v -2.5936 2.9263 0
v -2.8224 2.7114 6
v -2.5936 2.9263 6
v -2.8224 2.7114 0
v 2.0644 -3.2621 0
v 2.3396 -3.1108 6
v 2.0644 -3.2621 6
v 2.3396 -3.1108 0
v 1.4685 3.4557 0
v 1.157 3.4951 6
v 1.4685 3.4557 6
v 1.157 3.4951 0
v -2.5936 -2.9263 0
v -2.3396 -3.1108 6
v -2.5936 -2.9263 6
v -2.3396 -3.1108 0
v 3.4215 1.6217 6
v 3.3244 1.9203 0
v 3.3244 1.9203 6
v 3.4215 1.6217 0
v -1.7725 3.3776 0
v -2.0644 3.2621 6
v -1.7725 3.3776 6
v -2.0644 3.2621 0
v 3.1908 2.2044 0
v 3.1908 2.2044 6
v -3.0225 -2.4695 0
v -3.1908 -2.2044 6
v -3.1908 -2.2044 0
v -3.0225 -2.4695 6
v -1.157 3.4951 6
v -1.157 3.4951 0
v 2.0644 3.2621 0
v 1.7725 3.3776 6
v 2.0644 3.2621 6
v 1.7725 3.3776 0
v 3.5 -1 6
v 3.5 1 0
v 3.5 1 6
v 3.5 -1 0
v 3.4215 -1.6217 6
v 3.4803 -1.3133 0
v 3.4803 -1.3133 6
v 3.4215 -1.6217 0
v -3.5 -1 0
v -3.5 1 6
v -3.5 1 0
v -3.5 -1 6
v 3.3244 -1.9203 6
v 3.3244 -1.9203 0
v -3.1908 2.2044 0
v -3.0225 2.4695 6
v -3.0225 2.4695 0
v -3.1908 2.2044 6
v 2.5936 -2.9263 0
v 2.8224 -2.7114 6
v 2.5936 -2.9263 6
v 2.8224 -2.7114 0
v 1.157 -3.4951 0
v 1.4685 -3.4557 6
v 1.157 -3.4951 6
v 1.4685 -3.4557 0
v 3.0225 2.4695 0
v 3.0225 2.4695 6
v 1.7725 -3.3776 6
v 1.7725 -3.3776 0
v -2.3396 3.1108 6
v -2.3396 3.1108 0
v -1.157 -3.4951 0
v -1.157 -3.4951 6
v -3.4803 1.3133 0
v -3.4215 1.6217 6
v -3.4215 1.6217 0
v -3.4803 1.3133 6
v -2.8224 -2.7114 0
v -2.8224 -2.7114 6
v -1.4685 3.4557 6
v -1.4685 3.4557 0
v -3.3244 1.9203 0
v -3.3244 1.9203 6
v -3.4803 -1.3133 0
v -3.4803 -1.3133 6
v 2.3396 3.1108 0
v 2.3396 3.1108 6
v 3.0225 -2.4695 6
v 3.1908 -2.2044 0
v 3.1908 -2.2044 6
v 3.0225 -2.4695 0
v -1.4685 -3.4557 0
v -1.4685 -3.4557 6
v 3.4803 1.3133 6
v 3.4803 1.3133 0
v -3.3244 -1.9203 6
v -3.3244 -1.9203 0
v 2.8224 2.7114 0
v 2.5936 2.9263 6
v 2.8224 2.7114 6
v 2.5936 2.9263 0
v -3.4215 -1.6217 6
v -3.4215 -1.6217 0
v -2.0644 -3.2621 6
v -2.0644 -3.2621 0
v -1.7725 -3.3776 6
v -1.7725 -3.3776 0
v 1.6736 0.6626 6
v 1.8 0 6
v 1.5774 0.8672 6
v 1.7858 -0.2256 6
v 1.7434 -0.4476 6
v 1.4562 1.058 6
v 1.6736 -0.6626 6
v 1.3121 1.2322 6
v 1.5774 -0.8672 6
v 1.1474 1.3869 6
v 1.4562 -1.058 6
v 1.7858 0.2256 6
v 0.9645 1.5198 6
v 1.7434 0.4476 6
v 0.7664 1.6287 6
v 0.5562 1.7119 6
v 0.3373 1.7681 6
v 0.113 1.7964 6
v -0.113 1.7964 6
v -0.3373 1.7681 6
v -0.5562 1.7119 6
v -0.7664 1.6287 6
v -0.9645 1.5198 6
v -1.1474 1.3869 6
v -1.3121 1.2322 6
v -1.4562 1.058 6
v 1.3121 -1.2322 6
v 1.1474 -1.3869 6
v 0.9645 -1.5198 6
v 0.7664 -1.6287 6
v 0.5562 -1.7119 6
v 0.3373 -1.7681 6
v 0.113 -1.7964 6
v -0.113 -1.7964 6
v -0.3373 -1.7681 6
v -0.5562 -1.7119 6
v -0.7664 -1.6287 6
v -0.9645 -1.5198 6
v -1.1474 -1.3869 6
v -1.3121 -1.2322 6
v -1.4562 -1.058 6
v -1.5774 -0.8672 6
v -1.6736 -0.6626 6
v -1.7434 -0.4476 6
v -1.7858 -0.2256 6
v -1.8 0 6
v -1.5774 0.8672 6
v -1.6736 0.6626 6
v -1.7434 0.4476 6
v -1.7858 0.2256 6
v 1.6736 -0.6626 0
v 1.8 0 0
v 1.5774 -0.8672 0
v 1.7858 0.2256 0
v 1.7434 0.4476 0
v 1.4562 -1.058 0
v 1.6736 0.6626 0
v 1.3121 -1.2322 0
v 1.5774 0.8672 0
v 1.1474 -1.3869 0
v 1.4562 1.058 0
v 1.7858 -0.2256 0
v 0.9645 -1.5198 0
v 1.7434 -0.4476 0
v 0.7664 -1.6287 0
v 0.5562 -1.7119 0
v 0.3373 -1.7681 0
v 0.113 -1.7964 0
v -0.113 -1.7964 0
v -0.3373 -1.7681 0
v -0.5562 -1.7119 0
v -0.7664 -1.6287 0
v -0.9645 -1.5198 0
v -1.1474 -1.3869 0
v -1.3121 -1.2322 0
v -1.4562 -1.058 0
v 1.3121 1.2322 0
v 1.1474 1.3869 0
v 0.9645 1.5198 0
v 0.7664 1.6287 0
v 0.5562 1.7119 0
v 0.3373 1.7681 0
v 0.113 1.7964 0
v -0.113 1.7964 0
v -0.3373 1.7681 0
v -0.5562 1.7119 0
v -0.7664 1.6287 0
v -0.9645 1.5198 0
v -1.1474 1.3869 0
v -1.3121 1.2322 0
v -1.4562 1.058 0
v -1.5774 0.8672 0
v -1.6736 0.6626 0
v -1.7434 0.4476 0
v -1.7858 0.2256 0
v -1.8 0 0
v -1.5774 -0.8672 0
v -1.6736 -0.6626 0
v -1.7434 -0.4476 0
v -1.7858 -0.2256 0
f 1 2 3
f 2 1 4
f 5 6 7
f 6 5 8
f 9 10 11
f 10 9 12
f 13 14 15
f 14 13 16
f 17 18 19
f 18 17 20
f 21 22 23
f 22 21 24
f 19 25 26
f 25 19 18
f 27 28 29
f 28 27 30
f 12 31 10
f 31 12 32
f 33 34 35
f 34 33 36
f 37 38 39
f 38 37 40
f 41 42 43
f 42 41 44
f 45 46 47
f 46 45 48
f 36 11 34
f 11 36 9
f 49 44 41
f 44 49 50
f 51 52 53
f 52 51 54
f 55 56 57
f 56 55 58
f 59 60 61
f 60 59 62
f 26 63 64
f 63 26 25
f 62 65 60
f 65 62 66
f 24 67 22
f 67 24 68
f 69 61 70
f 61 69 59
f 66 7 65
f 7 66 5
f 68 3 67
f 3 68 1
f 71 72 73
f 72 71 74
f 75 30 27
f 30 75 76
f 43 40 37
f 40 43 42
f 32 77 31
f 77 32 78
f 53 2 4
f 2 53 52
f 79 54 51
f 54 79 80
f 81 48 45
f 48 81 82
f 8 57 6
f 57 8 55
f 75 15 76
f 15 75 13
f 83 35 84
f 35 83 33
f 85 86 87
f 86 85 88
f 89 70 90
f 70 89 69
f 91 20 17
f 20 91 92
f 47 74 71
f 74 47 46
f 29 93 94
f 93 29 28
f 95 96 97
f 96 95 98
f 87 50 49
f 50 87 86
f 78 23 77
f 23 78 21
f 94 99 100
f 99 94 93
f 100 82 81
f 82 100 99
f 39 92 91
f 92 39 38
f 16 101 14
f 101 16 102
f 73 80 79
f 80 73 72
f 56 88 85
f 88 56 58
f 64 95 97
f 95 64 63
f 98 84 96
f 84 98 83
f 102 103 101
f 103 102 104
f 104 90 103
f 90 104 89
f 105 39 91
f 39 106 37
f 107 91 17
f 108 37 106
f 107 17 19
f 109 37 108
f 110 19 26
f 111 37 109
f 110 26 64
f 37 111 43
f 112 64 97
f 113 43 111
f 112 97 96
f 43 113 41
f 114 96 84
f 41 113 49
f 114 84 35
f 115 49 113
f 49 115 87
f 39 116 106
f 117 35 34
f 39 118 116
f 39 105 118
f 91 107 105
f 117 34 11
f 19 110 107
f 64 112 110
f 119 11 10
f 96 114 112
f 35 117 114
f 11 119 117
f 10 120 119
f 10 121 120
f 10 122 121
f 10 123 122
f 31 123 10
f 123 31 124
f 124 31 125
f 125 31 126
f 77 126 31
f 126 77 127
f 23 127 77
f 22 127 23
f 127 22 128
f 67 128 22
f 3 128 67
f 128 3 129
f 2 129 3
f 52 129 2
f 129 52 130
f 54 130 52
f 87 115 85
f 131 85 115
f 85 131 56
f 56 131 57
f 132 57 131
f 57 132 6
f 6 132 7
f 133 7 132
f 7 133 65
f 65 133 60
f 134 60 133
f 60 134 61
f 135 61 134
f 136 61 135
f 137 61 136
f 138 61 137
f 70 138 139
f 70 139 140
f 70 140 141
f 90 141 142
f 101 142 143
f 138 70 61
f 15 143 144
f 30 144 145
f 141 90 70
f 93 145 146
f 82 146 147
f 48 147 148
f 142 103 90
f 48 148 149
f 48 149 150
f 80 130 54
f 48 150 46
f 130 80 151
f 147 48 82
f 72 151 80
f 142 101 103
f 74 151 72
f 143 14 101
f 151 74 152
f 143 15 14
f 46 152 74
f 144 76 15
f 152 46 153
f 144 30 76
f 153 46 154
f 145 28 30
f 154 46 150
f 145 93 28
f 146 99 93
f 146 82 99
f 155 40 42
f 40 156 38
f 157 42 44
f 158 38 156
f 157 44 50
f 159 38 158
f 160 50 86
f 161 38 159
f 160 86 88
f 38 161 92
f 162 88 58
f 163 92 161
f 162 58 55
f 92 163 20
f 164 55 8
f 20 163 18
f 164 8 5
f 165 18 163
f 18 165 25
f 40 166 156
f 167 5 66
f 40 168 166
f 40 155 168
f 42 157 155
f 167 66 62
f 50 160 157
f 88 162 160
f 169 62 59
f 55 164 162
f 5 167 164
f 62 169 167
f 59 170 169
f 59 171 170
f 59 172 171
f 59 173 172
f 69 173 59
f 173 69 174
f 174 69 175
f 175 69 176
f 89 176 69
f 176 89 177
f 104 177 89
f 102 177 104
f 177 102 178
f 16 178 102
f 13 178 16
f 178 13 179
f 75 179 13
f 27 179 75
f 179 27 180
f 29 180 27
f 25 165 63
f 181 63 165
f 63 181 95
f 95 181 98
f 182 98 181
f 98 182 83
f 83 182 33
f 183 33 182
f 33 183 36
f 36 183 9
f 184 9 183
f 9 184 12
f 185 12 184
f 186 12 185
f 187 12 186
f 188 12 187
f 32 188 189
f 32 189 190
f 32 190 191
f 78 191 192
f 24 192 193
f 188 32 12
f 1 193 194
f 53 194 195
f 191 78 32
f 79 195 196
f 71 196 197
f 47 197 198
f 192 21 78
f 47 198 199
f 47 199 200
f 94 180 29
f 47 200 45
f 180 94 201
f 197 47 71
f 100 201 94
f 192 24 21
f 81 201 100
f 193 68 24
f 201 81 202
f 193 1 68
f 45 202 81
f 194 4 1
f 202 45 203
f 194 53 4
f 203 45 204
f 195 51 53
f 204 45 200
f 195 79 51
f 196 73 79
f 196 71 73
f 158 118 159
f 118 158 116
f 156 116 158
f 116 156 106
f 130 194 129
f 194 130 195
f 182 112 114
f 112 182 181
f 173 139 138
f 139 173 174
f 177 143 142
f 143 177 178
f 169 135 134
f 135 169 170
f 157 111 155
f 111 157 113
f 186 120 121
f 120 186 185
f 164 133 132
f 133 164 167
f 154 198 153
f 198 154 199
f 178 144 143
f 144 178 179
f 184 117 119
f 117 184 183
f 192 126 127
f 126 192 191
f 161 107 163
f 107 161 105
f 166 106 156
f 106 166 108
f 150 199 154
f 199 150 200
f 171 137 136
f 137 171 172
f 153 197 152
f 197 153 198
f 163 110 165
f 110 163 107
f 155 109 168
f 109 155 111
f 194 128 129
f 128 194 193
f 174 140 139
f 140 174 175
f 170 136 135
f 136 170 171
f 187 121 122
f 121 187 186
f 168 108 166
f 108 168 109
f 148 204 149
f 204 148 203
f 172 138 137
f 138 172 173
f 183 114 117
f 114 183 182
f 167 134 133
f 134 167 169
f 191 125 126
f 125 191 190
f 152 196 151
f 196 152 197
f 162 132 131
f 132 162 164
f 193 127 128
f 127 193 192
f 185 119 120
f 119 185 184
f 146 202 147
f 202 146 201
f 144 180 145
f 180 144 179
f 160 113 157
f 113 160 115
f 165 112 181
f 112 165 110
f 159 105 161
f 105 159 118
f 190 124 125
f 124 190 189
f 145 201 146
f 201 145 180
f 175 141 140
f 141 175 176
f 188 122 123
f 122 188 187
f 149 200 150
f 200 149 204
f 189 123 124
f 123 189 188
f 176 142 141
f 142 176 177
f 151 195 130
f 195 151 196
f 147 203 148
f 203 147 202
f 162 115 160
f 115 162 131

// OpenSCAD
$fn = 50;


difference() {
	union() {
		translate(v = [0, 0, 0]) {
			rotate(a = [0, 0, 0]) {
				hull() {
					translate(v = [-1.0000000000, 1.0000000000, 0]) {
						rotate(a = [0, 0, 0]) {
							translate(v = [0, 0, 0]) {
								rotate(a = [0, 0, 0]) {
									cylinder(h = 6, r = 2.5000000000);
								}
							}
						}
					}
					translate(v = [1.0000000000, 1.0000000000, 0]) {
						rotate(a = [0, 0, 0]) {
							translate(v = [0, 0, 0]) {
								rotate(a = [0, 0, 0]) {
									cylinder(h = 6, r = 2.5000000000);
								}
							}
						}
					}
					translate(v = [-1.0000000000, -1.0000000000, 0]) {
						rotate(a = [0, 0, 0]) {
							translate(v = [0, 0, 0]) {
								rotate(a = [0, 0, 0]) {
									cylinder(h = 6, r = 2.5000000000);
								}
							}
						}
					}
					translate(v = [1.0000000000, -1.0000000000, 0]) {
						rotate(a = [0, 0, 0]) {
							translate(v = [0, 0, 0]) {
								rotate(a = [0, 0, 0]) {
									cylinder(h = 6, r = 2.5000000000);
								}
							}
						}
					}
				}
			}
		}
	}
	union() {
		translate(v = [0.0000000000, 0.0000000000, 0]) {
			rotate(a = [0, 0, 0]) {
				translate(v = [0, 0, -50]) {
					rotate(a = [0, 0, 0]) {
						cylinder(h = 100, r = 1.8000000000);
					}
				}
			}
		}
	}
}
